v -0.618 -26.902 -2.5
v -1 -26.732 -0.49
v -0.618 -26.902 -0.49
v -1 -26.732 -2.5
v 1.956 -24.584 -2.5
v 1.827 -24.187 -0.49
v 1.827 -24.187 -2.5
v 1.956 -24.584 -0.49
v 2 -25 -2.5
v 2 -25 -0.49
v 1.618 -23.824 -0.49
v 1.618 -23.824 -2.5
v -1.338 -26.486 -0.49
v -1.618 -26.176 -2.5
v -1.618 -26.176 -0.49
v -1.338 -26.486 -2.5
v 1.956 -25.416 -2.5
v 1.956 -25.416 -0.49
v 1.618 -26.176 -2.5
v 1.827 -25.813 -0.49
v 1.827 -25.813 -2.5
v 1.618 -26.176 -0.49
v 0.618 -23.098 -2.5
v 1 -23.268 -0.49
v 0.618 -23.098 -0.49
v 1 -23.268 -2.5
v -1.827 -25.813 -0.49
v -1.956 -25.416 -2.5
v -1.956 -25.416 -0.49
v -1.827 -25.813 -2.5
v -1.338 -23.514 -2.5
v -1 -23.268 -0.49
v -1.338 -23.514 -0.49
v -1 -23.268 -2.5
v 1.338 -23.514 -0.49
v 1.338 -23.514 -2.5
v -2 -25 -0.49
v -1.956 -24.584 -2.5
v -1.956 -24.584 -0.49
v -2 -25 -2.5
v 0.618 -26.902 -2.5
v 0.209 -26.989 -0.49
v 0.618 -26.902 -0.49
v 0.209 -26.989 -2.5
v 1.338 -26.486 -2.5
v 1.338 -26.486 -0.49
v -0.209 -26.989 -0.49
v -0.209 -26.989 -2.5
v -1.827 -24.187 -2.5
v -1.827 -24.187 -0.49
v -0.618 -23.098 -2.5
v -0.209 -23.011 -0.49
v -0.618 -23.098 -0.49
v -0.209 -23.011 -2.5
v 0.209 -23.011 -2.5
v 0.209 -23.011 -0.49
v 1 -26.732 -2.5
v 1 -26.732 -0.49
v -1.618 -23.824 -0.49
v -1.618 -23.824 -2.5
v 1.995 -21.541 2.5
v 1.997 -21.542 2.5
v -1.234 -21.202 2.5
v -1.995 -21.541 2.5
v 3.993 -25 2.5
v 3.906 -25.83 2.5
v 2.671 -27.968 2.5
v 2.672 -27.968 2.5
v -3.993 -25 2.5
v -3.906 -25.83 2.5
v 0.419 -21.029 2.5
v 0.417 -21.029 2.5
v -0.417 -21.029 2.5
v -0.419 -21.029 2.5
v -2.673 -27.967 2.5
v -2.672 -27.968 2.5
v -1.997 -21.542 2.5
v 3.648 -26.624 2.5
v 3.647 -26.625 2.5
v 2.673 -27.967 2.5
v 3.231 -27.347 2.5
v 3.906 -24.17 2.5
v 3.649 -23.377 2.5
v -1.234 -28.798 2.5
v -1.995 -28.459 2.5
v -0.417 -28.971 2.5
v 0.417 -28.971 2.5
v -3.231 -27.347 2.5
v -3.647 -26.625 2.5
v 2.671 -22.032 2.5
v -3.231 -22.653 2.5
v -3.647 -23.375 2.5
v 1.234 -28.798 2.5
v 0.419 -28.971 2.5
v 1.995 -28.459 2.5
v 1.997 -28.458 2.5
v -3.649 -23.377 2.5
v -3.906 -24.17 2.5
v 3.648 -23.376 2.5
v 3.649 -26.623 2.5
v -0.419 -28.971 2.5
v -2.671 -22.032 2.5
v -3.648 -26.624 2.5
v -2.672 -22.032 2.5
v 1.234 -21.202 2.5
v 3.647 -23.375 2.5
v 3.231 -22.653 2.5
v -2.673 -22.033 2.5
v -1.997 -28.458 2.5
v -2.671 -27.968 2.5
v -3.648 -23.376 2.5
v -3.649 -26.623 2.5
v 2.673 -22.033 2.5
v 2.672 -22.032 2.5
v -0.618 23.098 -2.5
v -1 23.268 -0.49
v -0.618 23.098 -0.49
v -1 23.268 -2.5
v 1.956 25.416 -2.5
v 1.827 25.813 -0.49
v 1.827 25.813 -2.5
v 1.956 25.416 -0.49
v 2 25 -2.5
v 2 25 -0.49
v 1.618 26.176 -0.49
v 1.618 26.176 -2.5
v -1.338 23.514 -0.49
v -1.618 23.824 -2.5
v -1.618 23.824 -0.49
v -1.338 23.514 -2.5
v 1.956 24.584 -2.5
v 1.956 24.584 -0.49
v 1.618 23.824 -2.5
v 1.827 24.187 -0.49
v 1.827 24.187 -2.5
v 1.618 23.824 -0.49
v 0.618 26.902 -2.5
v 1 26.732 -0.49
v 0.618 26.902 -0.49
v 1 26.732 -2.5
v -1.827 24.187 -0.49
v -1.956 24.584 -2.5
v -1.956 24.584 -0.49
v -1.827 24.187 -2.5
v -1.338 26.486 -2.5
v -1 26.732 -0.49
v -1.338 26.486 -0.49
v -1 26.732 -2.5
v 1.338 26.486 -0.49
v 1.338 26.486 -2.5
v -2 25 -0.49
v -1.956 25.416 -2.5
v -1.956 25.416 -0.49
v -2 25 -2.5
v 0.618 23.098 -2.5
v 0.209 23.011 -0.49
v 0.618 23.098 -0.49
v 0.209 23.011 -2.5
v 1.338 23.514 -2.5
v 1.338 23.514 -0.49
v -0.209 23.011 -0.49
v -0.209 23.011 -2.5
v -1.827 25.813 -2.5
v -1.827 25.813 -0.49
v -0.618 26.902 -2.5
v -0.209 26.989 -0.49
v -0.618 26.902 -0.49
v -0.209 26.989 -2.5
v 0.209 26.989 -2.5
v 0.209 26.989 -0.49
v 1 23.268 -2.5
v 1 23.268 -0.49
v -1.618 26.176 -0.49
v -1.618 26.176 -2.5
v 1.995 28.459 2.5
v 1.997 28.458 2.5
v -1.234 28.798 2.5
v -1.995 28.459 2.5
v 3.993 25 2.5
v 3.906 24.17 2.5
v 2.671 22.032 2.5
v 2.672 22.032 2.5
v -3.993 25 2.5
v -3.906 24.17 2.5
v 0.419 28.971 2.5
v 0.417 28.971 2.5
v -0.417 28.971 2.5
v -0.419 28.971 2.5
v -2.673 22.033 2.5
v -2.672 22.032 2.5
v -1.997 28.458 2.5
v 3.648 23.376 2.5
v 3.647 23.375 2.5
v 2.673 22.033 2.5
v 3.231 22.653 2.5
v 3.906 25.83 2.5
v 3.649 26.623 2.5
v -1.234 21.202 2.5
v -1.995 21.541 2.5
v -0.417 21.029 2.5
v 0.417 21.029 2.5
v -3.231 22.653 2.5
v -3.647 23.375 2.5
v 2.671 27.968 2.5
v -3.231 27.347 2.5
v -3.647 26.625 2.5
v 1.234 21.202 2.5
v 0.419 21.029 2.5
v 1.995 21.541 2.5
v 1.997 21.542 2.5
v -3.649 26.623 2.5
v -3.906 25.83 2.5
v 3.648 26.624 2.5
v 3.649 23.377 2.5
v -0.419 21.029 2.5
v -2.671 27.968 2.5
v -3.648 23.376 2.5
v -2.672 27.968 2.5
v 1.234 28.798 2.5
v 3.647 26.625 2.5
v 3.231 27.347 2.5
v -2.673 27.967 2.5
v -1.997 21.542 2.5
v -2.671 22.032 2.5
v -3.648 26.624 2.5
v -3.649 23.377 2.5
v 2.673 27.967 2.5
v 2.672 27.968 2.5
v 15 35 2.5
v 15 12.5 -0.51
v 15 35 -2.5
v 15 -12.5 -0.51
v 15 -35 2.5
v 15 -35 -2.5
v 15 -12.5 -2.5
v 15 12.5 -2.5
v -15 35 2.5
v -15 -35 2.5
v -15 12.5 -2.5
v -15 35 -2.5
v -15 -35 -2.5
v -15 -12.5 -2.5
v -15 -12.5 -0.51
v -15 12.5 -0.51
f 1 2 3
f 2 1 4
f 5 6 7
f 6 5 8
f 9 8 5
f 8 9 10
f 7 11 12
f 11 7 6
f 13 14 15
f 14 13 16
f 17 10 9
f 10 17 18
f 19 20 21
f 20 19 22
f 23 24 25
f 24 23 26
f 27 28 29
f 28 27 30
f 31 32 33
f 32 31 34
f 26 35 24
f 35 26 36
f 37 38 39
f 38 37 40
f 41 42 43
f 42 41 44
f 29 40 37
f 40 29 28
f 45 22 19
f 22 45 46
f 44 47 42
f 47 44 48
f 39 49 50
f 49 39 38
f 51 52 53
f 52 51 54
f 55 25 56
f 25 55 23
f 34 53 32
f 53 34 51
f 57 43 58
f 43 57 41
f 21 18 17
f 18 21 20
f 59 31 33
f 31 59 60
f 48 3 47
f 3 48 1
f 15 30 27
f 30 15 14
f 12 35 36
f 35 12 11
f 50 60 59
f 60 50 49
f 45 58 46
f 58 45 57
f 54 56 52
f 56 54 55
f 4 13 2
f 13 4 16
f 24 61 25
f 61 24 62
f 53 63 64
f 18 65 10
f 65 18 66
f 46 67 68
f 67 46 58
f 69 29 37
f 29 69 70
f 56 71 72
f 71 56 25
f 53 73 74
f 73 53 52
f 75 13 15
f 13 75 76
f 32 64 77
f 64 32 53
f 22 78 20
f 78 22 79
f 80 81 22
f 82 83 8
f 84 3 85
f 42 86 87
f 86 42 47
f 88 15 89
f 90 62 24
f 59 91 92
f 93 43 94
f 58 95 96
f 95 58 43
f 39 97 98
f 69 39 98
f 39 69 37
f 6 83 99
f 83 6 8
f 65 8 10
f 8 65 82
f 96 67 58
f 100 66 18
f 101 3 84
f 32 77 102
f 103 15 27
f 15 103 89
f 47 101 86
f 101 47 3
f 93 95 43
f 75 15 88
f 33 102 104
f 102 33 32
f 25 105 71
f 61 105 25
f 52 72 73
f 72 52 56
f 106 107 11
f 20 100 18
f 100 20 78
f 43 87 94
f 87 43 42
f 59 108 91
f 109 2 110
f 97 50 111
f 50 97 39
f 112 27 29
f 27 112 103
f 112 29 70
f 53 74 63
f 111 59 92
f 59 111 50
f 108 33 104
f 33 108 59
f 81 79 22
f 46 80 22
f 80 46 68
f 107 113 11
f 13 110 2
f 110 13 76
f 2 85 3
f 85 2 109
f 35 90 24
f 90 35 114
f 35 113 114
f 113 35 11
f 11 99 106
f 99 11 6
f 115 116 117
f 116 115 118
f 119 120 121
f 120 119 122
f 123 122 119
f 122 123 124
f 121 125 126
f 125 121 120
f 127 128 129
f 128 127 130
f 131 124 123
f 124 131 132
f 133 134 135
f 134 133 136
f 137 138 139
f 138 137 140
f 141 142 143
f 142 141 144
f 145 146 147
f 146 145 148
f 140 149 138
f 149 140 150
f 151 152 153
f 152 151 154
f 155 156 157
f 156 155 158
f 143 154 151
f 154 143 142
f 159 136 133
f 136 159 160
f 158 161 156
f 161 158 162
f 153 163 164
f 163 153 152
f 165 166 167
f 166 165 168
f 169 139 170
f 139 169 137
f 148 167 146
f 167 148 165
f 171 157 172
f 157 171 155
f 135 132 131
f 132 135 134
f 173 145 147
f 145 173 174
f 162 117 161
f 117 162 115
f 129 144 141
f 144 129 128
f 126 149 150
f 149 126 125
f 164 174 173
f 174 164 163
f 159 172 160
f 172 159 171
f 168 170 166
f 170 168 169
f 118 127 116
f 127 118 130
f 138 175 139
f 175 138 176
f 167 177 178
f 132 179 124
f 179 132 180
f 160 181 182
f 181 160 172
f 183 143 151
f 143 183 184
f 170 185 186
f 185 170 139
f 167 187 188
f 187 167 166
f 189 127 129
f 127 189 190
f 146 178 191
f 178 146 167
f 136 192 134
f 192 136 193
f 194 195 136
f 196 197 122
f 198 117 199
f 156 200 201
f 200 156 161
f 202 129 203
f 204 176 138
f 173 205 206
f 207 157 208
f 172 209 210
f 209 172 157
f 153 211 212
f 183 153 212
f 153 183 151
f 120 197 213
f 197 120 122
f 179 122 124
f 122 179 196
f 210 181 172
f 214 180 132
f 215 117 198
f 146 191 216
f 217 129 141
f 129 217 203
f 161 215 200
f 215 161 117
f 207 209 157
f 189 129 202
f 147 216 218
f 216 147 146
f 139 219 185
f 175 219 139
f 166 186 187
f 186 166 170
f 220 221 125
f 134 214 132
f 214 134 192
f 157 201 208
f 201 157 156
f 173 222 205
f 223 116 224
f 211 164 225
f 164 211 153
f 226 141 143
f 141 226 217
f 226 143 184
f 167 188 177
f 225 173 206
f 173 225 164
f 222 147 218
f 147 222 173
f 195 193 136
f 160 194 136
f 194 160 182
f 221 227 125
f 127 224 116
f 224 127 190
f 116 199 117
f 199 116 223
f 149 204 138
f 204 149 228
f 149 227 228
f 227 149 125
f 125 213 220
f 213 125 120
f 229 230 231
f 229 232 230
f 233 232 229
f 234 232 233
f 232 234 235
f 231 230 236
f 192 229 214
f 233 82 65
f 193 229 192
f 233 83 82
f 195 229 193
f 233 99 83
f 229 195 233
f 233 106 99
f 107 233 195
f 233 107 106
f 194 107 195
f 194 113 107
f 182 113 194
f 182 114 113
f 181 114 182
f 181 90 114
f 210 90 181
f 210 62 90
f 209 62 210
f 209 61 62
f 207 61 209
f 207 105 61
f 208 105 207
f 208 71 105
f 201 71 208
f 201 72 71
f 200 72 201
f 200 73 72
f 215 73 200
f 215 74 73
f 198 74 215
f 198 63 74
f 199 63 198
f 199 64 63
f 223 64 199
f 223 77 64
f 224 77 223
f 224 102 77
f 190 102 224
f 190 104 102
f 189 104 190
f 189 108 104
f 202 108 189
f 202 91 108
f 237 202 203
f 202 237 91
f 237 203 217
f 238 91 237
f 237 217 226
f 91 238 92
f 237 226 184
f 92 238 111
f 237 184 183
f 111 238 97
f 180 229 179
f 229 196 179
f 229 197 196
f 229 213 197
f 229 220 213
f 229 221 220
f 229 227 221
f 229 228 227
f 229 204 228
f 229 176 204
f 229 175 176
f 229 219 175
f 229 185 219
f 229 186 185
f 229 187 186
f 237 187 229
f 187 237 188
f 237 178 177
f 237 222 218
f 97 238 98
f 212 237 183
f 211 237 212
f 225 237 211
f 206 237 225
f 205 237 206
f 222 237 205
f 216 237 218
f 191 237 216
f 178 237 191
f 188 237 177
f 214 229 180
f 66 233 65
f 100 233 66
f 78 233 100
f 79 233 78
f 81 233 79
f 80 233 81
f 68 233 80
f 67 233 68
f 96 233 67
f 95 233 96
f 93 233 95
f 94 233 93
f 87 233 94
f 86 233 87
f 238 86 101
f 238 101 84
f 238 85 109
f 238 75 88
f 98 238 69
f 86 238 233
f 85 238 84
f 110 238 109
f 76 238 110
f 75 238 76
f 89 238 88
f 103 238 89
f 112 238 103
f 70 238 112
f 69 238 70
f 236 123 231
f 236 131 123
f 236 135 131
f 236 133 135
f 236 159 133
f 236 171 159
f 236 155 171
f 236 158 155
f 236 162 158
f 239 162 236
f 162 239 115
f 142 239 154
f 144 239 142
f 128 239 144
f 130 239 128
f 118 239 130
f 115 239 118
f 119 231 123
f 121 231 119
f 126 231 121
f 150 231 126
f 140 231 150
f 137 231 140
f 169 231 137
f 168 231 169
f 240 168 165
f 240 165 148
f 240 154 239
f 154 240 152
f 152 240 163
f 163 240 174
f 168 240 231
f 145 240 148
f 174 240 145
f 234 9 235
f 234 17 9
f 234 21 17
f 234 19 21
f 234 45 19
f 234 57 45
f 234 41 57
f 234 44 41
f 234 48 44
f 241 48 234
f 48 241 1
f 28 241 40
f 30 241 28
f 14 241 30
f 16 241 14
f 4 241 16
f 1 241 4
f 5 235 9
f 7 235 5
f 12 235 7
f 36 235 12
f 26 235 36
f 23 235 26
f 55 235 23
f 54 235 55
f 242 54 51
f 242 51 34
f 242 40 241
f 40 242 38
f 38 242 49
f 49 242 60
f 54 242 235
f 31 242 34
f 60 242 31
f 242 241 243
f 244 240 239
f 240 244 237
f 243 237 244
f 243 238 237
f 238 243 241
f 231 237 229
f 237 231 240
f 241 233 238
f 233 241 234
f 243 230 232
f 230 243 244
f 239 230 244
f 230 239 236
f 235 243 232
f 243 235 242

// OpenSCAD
$fn = 30;

module screw(hole = 4, height=3, head = 8){
        cylinder(30,d=hole, center=true);
    cylinder(h = height, d1 = hole, d2 = head);
    
    }


difference(){
cube([30, 70, 5], center = true);
    translate([0,-25,-0.49])
         screw();
    translate([0,25,-0.49])
         screw();
    //strap
    translate([0,0,-1.51])
         cube([32, 25,2], center = true); 
}
